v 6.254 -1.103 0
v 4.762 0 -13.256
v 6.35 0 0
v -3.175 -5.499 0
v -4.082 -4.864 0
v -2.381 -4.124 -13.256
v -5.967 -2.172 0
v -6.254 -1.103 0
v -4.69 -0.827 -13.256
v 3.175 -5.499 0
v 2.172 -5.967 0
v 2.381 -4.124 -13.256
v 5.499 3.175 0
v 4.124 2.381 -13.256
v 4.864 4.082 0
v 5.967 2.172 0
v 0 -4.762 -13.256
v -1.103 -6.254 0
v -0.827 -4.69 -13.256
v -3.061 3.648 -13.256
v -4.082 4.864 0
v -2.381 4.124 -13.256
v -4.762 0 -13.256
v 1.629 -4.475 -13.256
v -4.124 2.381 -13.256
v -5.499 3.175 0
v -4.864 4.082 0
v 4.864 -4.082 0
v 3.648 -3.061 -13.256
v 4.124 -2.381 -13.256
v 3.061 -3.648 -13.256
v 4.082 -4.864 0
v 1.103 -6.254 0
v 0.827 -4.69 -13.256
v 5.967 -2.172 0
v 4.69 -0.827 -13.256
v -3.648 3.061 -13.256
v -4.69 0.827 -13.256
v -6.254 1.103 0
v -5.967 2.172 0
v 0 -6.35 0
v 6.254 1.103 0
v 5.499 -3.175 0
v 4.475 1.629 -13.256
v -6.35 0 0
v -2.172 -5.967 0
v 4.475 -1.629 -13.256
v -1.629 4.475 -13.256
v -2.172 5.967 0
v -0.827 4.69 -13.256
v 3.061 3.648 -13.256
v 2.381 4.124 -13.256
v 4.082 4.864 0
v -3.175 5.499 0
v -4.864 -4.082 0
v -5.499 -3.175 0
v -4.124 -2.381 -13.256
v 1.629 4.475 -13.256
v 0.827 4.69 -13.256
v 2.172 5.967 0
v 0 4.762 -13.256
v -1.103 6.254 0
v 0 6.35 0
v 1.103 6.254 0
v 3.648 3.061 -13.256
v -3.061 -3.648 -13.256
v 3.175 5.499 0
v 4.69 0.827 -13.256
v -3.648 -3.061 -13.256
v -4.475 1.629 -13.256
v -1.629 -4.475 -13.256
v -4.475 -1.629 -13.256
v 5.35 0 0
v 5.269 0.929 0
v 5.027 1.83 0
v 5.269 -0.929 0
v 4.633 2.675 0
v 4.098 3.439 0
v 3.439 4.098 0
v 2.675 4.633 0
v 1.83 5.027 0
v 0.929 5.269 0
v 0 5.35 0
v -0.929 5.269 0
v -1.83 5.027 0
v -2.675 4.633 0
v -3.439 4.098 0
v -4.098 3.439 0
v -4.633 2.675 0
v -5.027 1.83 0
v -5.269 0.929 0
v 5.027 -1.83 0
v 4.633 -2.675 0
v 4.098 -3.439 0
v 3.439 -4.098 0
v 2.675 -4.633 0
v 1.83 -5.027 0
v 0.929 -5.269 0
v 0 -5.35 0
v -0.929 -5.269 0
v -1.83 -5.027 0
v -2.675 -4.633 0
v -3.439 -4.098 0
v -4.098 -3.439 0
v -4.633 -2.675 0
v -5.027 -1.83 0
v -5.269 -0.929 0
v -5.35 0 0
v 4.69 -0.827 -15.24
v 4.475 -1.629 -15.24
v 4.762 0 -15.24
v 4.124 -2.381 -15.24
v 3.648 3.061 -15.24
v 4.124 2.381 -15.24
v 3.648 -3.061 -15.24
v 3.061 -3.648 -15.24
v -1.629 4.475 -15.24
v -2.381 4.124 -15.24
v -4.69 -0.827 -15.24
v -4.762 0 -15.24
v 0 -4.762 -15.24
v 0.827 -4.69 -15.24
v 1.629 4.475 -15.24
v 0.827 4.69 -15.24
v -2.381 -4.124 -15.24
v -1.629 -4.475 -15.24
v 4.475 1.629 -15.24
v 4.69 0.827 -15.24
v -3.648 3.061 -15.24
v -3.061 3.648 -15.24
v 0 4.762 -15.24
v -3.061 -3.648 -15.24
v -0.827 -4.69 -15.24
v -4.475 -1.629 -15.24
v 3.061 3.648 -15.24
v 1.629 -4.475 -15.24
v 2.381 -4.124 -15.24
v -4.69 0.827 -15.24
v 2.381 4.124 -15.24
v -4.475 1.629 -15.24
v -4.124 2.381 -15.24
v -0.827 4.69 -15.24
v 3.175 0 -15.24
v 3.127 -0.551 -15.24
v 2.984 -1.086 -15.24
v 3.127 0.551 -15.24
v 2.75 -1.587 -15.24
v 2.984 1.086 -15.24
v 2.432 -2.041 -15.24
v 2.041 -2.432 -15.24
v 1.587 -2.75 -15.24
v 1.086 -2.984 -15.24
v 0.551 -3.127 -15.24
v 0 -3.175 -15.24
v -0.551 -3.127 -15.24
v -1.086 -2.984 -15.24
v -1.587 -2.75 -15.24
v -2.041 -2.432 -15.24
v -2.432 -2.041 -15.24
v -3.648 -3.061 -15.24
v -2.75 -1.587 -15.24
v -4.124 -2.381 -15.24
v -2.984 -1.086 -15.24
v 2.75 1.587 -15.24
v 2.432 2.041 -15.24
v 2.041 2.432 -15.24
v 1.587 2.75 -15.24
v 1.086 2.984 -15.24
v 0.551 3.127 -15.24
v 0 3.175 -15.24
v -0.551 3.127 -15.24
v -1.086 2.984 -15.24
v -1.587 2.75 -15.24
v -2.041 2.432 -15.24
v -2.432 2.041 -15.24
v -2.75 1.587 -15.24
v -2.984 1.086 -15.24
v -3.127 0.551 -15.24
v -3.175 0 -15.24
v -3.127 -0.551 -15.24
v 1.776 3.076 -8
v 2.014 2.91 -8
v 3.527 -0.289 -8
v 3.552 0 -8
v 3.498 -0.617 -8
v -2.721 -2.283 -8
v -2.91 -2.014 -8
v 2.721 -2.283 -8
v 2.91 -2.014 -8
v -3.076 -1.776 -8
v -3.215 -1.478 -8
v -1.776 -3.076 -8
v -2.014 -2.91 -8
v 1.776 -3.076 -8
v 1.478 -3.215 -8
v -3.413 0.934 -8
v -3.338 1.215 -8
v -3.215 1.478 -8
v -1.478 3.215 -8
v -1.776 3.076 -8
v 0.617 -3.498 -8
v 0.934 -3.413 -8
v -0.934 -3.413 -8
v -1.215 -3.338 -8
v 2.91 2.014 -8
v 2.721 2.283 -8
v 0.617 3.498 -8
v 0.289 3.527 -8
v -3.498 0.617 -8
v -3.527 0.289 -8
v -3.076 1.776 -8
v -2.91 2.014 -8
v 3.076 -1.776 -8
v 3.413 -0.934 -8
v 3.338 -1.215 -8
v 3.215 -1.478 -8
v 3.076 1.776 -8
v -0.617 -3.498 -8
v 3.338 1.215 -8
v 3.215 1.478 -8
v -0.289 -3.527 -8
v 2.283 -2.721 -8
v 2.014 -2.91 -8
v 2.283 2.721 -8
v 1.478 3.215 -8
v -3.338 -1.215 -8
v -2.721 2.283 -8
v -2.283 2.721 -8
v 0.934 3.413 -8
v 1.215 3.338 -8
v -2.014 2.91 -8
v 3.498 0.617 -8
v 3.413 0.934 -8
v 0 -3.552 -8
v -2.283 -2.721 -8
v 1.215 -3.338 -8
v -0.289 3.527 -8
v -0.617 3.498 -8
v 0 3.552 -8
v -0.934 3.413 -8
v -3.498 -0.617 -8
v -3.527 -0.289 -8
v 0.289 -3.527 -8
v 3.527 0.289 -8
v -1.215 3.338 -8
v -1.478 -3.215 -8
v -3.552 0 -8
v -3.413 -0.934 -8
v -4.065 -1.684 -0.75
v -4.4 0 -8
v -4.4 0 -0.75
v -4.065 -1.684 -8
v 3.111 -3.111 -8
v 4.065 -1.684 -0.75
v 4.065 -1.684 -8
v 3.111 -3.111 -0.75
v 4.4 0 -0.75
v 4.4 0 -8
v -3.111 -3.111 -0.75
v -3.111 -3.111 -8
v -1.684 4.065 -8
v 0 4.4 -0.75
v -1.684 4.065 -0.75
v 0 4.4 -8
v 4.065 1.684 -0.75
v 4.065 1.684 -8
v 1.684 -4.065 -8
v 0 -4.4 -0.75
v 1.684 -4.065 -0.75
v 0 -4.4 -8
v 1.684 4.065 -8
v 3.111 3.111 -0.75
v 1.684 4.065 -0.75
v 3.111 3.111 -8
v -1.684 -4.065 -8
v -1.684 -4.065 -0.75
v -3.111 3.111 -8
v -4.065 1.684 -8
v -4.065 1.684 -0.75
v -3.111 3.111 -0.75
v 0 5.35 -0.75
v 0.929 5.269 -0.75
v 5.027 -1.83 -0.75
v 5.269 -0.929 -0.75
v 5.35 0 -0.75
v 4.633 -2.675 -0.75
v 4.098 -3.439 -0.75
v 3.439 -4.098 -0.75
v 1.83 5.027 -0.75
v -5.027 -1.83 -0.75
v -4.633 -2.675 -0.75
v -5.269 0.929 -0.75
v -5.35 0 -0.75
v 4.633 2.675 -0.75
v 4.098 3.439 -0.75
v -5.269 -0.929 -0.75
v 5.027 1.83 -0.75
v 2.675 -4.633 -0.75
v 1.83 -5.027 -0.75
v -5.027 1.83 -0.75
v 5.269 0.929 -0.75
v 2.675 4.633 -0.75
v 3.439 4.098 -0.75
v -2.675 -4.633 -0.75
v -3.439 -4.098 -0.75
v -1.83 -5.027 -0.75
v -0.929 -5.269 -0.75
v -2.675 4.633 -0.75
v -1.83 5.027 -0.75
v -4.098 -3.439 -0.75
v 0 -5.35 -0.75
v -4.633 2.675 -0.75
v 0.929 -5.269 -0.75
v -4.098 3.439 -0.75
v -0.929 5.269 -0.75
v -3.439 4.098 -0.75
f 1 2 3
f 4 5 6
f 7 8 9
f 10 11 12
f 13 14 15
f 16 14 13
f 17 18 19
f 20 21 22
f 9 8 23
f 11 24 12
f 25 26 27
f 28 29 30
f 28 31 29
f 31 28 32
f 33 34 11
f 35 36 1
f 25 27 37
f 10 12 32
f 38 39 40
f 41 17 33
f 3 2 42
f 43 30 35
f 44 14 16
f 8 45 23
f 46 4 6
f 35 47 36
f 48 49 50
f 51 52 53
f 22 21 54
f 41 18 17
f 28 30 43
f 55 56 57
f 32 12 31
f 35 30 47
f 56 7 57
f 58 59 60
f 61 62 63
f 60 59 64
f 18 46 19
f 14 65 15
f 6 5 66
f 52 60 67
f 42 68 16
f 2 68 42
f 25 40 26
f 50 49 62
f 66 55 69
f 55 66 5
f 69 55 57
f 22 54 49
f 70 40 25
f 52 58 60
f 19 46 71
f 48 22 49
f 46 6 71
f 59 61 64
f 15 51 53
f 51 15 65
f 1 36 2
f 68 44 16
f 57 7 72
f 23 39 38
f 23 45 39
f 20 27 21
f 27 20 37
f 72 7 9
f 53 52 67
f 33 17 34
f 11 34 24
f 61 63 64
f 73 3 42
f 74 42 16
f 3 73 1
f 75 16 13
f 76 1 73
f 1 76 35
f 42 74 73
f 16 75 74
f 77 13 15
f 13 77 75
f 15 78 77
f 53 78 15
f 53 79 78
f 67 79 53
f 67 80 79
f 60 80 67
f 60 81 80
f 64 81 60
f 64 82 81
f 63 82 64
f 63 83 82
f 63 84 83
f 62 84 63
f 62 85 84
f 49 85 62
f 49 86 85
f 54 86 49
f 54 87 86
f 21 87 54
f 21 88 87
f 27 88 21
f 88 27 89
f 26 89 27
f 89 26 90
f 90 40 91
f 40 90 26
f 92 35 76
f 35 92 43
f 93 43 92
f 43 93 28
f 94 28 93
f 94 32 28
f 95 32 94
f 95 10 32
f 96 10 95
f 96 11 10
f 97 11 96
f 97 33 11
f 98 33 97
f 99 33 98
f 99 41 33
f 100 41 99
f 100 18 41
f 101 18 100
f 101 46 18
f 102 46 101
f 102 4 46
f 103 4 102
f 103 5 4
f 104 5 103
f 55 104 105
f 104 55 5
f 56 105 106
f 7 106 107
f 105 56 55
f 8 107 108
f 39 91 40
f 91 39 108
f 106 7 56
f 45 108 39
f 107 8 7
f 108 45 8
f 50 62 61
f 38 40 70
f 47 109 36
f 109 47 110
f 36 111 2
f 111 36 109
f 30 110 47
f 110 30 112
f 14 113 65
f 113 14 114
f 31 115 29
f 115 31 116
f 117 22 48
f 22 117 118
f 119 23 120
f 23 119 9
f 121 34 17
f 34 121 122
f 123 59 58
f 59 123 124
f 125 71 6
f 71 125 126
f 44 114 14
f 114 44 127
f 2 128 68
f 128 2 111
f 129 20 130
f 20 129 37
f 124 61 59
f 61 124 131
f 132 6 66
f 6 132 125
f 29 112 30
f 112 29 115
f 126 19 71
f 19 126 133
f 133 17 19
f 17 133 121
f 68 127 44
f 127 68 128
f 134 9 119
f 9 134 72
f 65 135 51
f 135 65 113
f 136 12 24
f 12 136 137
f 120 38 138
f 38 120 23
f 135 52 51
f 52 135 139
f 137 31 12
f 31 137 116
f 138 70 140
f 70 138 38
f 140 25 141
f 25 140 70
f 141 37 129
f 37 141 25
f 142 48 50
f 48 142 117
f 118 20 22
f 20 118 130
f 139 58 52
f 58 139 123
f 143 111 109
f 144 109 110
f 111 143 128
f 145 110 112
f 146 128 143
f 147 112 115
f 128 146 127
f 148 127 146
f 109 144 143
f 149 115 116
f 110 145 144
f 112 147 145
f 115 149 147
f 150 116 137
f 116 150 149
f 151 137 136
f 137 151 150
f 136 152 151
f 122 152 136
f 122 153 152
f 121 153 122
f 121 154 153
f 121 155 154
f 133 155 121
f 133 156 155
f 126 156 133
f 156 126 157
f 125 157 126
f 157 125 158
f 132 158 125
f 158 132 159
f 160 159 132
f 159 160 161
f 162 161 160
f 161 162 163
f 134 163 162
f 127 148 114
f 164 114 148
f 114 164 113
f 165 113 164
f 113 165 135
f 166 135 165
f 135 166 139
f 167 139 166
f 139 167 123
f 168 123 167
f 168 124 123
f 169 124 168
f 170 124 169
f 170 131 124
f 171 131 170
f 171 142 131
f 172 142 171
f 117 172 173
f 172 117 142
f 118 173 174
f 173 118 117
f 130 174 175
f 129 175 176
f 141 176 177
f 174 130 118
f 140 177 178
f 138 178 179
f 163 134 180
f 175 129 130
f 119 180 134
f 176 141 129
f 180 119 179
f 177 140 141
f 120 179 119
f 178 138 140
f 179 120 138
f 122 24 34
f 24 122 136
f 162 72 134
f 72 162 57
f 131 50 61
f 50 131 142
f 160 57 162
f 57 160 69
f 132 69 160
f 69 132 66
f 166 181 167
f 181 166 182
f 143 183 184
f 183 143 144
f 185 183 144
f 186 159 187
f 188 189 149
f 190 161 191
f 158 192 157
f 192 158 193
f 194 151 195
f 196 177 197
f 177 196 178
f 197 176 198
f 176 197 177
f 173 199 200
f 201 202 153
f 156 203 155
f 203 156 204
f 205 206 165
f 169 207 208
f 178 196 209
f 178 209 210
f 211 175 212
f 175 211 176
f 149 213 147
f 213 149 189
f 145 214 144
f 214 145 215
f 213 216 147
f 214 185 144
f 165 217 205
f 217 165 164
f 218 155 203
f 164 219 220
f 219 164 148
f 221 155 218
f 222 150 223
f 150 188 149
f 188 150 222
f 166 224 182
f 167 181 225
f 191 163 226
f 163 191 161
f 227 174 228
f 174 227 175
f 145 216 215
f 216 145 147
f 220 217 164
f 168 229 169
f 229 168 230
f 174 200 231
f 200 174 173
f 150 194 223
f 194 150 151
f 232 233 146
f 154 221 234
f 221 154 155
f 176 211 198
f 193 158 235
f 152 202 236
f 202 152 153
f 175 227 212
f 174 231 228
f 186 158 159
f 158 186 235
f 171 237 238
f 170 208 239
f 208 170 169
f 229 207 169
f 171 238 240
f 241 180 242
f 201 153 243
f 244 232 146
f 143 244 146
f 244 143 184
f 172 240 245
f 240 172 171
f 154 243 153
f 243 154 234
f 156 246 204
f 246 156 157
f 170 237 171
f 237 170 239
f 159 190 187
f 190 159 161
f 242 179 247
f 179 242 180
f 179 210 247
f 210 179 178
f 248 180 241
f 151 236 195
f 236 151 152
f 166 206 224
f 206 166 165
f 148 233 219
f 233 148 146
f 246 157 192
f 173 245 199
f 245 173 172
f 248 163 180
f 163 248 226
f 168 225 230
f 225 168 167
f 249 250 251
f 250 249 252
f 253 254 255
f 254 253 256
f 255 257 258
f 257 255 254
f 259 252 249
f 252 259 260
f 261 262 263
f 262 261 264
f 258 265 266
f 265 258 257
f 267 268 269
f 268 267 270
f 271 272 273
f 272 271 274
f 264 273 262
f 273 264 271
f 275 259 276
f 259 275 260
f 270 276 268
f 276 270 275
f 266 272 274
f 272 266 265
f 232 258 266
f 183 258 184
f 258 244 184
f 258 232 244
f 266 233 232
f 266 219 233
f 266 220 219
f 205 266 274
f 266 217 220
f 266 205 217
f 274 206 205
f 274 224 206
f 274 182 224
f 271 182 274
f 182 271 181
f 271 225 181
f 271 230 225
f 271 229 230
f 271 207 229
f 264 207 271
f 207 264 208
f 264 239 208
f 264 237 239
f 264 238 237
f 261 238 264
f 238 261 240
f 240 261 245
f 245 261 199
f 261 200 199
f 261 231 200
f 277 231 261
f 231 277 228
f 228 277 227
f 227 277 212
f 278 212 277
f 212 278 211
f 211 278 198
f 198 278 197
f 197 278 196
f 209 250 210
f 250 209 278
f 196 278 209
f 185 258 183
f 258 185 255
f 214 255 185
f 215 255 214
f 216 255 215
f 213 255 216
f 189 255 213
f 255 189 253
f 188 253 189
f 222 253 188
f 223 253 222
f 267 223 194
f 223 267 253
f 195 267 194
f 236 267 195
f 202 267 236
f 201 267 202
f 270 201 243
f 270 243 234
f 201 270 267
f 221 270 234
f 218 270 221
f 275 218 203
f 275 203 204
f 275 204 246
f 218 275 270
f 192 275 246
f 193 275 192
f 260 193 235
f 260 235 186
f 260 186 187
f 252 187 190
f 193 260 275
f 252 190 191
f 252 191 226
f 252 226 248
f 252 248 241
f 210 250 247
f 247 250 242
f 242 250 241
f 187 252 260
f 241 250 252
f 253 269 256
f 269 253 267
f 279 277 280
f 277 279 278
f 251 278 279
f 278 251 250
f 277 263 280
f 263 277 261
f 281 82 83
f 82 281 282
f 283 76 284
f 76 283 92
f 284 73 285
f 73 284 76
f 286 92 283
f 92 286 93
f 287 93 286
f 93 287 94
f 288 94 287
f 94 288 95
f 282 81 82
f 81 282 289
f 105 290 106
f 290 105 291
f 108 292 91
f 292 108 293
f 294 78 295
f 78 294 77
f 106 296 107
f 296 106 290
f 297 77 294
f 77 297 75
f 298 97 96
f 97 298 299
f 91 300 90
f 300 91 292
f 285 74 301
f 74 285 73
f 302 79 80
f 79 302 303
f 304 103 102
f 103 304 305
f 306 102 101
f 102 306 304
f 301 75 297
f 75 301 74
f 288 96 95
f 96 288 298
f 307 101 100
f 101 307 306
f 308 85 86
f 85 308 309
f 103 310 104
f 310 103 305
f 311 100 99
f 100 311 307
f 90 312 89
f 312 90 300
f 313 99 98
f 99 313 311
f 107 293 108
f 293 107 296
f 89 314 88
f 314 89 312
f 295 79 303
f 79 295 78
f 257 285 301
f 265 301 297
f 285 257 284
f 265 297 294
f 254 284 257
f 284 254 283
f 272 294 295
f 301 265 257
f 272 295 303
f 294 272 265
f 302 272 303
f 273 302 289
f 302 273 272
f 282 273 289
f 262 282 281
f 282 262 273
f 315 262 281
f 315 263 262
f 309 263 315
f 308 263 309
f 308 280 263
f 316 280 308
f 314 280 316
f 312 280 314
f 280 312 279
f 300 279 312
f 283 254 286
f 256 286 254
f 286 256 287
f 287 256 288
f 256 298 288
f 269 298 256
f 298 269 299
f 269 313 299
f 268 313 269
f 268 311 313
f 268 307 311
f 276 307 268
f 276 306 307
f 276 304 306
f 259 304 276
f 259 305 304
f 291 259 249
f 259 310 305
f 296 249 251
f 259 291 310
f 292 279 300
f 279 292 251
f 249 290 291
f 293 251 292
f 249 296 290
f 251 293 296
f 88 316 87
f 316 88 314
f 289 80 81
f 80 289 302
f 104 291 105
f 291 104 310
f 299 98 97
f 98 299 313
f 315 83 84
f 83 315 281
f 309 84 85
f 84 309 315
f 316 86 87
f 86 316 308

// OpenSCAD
// As an American whose relatives work in construction, I've always
// been kind of a fan of the 12" imperial system.  It has some nice
// properties when you're building houses.
//
// That said, it's absolute crap for machining.  Please don't judge it
// too harshly here.  It's gotten a lot better with decimal work, but
// this part clearly predates that era... -jbm

inch = 25.4; // conversion factor

$fn = 36;

rotate([180,0,0,0])

difference() {
  union() {
    cylinder(h=0.6*inch-5/64*inch, r2=3/8*inch/2, r1=1/2*inch/2);
    cylinder(h=0.6*inch, r=3/8*inch/2);
  }		     
  cylinder(h=0.6*inch, r1=5/16*inch/2, r2=1/4*inch/2, $fn=36);
  cylinder(h=8, r=8.8/2, $fn=16);
#  cylinder(h=0.75, r=1/2*inch/2-1);


  //  cube([100,100,100]);

  /*
  for (i = [ 0:10:350 ]) {

#	       rotate([0,0,i])

    rotate([0,-atan( (1/2-3/8)/2/(0.6-5/64) ),0]) // zomg
      translate([3/8*inch/2+0.03*inch+1, 0, 3/64*inch])
      union() {
      translate([0,0,0]) cylinder(h=29/64*inch, r=0.030*inch/2, $fn=10);
      sphere(r=0.030*inch/2, $fn=10);
    }
  }
  */
}
